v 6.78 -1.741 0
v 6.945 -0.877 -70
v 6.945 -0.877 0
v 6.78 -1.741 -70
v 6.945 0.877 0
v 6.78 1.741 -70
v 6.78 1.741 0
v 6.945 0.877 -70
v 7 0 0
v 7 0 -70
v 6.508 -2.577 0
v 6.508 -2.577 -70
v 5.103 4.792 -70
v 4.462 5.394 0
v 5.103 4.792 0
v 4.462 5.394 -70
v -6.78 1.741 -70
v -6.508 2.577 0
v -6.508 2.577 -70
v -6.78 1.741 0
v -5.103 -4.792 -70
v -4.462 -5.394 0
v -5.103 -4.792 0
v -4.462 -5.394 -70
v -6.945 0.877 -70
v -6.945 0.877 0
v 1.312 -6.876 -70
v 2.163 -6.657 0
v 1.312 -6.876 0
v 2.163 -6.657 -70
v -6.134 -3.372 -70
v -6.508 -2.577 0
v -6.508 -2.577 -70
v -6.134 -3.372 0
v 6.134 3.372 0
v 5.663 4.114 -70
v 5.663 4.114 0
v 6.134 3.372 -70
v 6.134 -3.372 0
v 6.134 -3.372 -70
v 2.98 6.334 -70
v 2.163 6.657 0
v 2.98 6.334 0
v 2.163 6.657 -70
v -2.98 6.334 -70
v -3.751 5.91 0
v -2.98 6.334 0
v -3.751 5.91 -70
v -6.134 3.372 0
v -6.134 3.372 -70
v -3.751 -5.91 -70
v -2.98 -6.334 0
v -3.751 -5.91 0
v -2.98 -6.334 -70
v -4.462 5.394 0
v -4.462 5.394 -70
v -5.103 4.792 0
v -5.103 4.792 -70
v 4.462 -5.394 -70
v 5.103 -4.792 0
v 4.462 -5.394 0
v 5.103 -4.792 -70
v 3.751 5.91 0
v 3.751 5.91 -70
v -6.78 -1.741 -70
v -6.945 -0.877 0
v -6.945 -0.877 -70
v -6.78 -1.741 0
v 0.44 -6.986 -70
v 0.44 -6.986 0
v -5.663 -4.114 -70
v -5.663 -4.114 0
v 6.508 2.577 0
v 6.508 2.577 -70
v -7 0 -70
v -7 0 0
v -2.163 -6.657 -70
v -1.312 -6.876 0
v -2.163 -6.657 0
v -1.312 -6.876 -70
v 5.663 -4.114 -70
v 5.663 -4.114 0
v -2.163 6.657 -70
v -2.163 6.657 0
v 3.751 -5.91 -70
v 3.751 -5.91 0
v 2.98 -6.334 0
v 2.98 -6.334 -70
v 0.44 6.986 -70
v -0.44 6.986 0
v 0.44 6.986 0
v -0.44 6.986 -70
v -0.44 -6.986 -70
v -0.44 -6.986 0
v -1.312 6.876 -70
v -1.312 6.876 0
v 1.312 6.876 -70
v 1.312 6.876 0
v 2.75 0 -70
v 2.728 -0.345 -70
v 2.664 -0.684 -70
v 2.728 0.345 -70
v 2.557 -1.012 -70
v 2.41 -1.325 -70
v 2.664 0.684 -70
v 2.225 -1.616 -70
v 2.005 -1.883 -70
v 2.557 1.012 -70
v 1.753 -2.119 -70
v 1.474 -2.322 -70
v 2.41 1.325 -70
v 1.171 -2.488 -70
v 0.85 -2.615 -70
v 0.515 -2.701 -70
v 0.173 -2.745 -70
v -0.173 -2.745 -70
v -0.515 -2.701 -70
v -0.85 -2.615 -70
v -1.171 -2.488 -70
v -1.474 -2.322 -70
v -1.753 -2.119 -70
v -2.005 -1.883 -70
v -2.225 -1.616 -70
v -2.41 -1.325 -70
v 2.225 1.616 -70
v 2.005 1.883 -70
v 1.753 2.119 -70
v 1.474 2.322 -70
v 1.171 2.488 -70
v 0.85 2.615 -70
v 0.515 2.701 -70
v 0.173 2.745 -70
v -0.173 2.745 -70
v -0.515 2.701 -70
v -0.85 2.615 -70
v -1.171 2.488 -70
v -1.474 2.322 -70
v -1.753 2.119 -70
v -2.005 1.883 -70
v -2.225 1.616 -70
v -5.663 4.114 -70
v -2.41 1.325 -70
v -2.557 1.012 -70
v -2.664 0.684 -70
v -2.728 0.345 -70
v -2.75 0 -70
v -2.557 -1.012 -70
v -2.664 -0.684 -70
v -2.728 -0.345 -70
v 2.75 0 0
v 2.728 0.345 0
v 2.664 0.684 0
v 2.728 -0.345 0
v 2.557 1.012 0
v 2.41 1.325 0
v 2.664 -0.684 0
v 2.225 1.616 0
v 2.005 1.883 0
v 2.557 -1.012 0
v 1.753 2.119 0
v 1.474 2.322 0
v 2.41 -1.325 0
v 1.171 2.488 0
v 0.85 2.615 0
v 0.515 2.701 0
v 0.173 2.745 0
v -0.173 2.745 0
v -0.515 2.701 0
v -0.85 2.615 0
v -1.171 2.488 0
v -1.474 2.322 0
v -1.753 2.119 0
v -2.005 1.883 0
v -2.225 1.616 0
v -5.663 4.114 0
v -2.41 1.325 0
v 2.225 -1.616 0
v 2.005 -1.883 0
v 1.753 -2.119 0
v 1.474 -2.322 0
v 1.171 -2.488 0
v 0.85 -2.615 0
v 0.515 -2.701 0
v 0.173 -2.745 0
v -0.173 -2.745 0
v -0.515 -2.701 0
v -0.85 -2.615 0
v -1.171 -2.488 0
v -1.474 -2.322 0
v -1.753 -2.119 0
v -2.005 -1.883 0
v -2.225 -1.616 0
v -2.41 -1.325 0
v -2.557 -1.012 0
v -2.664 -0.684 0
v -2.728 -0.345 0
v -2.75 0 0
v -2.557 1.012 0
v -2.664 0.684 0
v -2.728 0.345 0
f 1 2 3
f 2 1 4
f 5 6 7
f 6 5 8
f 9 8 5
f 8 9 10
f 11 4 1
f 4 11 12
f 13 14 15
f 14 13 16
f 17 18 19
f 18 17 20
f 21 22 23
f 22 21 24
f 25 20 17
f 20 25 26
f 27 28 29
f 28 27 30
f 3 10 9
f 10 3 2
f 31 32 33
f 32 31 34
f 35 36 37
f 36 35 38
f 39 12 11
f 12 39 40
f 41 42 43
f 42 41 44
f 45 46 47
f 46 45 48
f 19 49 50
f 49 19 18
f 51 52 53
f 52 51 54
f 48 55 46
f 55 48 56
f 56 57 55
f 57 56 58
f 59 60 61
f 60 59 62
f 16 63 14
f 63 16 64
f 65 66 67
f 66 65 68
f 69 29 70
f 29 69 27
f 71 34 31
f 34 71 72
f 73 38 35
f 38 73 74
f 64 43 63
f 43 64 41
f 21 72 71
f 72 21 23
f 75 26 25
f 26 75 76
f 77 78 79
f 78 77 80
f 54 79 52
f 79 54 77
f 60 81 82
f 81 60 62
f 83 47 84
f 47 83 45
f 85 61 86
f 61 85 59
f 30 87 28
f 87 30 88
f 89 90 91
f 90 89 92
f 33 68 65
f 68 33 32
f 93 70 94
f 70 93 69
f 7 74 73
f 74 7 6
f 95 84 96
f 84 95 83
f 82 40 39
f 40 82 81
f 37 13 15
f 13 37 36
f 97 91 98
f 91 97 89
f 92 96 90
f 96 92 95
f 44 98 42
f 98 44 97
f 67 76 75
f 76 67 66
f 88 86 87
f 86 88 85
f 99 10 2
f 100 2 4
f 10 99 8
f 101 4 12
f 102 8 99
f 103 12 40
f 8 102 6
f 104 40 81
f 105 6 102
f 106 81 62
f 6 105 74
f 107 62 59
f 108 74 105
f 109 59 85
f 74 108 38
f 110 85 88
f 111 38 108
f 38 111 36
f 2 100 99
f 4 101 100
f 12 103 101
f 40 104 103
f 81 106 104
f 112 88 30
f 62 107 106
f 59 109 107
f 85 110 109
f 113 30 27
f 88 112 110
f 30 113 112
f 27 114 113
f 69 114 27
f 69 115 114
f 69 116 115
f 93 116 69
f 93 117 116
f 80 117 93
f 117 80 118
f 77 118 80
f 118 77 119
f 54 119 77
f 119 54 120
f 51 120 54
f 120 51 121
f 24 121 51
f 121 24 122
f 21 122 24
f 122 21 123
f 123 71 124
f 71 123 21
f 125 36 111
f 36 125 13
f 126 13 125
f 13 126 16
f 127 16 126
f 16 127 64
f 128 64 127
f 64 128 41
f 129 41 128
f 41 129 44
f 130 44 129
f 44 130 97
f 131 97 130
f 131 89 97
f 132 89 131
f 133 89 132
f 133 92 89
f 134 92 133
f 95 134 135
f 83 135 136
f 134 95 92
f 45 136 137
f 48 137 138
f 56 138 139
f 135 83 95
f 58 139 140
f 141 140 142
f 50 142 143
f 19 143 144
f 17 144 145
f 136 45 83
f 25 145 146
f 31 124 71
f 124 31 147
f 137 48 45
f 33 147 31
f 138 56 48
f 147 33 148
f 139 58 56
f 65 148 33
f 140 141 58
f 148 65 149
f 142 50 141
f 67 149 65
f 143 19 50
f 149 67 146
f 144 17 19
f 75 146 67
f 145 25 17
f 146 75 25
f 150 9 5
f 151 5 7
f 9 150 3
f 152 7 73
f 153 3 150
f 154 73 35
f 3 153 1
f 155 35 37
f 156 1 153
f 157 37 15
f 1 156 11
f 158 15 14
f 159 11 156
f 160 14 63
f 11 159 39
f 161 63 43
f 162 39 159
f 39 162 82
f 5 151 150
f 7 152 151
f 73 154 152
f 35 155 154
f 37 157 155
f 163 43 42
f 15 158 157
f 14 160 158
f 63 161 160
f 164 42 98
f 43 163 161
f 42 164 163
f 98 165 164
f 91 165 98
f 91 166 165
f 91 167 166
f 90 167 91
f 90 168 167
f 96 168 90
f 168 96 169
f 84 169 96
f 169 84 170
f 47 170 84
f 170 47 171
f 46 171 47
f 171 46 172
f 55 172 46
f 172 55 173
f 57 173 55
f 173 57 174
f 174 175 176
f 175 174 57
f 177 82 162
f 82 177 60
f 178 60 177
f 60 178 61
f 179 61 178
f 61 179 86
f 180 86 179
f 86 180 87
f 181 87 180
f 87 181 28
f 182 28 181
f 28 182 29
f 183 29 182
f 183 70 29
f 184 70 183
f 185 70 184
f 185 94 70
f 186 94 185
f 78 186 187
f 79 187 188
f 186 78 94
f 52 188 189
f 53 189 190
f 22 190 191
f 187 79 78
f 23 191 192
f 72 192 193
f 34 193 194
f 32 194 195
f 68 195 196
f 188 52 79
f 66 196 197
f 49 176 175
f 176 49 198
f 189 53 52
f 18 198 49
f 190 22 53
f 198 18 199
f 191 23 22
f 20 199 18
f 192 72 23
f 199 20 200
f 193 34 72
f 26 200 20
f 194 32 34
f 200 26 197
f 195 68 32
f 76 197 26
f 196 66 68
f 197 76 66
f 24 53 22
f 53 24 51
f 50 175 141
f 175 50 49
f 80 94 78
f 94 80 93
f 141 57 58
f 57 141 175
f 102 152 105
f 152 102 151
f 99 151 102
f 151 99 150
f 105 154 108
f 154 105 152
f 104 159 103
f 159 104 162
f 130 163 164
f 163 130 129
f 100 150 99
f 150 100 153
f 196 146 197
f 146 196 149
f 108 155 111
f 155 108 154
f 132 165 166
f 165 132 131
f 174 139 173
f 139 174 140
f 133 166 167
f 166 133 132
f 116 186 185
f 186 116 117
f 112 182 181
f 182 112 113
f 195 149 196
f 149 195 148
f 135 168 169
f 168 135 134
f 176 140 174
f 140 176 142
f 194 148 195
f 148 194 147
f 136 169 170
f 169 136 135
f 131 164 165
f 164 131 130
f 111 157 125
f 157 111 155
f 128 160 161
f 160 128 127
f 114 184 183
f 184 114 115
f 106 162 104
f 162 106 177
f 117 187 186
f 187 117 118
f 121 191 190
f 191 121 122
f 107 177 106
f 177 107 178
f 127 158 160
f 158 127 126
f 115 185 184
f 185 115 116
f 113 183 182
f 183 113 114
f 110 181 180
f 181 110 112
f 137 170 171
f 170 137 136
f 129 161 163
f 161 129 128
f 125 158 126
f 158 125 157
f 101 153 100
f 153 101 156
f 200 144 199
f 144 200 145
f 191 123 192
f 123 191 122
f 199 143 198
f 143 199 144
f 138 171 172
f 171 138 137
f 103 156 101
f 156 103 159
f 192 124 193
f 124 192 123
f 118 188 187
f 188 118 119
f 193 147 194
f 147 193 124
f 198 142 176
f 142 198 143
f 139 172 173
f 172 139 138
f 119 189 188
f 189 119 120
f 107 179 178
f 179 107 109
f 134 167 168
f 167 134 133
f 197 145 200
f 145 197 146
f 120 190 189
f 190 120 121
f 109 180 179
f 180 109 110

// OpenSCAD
$fn = 50;


difference() {
	union() {
		translate(v = [0, 0, -70.0000000000]) {
			cylinder(h = 70, r = 7.0000000000);
		}
		cylinder(h = 0, r = 17.0000000000);
	}
	union() {
		#translate(v = [0, 0, -70]) {
			cylinder(h = 70, r = 2.7500000000);
		}
	}
}
